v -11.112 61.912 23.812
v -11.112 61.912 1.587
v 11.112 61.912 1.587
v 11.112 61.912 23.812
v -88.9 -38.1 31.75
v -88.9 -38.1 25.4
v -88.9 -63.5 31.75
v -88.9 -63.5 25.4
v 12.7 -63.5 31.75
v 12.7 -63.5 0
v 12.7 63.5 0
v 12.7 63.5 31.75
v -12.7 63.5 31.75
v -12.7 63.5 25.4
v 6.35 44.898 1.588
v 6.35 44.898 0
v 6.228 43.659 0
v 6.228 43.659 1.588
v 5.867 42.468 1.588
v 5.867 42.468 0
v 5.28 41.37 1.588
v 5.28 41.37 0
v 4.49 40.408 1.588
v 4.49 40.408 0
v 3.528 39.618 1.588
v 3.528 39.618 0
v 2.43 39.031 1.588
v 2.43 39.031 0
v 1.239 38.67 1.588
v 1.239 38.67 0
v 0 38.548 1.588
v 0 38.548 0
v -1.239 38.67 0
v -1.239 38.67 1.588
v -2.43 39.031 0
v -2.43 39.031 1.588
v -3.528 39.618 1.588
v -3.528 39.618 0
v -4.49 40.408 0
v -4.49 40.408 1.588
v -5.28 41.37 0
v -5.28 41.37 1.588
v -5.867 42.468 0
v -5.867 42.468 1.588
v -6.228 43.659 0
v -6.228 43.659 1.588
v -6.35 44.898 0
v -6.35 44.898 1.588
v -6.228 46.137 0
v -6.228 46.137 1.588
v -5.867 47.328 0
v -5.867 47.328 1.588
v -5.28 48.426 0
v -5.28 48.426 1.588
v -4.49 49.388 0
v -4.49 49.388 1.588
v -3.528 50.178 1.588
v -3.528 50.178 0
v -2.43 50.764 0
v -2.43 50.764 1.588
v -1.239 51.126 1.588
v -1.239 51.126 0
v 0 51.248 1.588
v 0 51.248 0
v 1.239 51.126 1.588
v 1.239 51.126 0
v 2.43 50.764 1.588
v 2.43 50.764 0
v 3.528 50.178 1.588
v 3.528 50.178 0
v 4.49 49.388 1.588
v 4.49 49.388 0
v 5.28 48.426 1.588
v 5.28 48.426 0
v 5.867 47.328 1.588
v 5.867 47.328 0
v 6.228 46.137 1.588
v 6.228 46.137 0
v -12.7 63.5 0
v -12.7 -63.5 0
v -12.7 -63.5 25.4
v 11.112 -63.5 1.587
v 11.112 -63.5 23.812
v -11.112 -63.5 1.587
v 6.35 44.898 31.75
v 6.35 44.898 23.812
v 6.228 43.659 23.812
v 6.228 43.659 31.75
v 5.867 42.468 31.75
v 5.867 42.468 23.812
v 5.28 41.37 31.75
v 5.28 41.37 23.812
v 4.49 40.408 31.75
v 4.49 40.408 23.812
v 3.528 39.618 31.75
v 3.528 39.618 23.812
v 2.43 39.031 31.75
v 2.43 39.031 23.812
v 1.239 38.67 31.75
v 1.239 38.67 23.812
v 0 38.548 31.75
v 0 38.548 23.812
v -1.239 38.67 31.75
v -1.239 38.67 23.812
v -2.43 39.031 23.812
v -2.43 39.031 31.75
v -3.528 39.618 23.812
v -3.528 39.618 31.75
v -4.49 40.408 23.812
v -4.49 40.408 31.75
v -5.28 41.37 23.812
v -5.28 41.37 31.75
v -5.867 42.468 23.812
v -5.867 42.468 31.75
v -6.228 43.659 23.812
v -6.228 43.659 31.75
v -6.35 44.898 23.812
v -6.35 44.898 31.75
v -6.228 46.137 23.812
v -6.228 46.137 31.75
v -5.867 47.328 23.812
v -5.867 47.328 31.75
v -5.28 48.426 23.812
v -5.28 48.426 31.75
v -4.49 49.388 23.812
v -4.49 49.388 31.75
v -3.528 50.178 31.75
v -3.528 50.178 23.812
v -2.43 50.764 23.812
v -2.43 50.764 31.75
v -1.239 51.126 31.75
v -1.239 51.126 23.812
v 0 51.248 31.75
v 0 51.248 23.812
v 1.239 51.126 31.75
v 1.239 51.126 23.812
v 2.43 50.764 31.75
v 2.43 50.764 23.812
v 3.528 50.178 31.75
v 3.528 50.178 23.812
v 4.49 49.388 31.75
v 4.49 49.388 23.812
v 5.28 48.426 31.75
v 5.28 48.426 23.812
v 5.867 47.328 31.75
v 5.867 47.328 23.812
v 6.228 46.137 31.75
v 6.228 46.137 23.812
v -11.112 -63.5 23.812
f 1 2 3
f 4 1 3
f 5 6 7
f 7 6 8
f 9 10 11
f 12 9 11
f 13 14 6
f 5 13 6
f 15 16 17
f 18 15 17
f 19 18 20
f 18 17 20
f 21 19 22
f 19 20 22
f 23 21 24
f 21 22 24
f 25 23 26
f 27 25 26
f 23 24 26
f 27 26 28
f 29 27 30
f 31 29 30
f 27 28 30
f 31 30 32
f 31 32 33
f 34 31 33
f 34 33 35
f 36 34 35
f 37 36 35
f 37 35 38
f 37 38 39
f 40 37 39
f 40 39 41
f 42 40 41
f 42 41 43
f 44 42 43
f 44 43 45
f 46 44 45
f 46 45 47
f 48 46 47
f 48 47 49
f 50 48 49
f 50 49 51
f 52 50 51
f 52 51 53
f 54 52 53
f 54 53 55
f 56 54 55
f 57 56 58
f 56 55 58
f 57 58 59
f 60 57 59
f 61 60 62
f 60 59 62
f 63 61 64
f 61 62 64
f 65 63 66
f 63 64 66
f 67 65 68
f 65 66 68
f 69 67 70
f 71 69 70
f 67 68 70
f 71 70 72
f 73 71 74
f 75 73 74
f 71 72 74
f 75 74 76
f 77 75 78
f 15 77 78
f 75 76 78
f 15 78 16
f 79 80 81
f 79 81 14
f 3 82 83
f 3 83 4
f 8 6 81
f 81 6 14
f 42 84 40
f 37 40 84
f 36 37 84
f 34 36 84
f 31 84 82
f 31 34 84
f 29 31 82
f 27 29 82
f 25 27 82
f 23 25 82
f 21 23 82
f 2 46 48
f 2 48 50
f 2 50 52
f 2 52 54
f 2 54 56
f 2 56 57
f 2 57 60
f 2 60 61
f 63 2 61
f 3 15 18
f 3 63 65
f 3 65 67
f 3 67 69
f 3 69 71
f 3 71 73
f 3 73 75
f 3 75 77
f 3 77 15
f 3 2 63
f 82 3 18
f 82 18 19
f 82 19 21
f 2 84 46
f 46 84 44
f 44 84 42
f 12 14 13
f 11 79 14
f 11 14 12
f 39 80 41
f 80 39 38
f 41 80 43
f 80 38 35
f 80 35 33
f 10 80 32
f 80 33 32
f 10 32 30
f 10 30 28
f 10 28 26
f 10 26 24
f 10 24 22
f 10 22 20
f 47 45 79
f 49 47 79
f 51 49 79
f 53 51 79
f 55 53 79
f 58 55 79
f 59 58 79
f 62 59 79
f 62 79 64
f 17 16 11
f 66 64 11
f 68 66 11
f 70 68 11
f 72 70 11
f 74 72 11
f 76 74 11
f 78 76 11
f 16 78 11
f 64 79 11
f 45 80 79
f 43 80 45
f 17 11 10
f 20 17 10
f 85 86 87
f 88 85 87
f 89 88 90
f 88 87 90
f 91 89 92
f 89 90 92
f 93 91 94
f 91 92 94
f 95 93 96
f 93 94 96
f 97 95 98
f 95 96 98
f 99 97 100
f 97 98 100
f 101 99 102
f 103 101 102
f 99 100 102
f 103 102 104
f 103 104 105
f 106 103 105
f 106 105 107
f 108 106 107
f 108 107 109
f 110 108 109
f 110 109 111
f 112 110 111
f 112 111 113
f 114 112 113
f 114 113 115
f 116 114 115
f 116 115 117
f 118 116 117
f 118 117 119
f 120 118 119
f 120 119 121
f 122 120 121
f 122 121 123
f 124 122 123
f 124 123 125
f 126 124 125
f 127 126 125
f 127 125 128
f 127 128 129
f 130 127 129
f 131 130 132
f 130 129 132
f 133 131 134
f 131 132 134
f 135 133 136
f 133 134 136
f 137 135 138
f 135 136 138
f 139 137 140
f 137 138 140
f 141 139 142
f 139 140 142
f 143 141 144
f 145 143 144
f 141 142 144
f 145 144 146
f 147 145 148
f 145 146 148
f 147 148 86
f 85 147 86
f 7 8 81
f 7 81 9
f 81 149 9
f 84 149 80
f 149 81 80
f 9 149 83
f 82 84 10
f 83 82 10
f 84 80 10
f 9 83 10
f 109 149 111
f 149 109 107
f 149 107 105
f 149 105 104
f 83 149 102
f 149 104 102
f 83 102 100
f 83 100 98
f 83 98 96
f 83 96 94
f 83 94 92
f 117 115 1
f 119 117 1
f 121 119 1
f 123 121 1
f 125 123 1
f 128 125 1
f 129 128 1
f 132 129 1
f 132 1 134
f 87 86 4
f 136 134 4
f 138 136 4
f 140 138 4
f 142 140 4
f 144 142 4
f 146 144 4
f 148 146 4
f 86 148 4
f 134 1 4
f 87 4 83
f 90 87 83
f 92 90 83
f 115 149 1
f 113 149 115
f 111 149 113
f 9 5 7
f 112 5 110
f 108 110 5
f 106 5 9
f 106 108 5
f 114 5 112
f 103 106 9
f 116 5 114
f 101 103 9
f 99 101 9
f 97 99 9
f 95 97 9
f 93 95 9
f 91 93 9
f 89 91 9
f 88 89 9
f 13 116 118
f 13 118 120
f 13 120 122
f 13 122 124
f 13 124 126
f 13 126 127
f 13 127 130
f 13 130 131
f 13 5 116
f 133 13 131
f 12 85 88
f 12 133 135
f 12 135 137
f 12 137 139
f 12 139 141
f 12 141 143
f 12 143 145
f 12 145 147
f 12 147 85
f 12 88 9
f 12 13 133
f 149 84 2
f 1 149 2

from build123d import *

# Parameters (mm, degrees)
F0_W     = 25.4
F0_H     = 127
F1_DEPTH = 25.4
F2_T     = -1.5875
F3_W     = 25.4
F3_H     = 127
F4_DEPTH = 6.35
F5_R     = 6.35
F6_DEPTH = 31.751


with BuildPart() as f1:
    # F0 (on Top) → F1 (new body)
    with BuildSketch(Plane.XY):
        Rectangle(F0_W, F0_H)
    extrude(amount=F1_DEPTH)

    # F2
    f2_openings = [f1.faces().sort_by_distance(p)[0] for p in [
        (0, -63.5, 12.7),
    ]]
    offset(amount=F2_T, openings=f2_openings)

    # F3 (on face) → F4 (join)
    with BuildSketch(Plane.XY.offset(25.4)):
        Rectangle(F3_W, F3_H)
        Polygon((-12.7, -63.5), (-12.7, 63.5), (-88.9, -38.1), (-88.9, -63.5), align=None)
    extrude(amount=F4_DEPTH)

    # F5 (on face) → F6 (cut, through all)
    with BuildSketch(Plane(origin=(0, 0, 0), x_dir=(1, 0, 0), z_dir=(0, 0, -1))):
        with Locations((0, -44.897698)):
            Circle(F5_R)
    extrude(amount=-F6_DEPTH, mode=Mode.SUBTRACT)


solid = f1.part
